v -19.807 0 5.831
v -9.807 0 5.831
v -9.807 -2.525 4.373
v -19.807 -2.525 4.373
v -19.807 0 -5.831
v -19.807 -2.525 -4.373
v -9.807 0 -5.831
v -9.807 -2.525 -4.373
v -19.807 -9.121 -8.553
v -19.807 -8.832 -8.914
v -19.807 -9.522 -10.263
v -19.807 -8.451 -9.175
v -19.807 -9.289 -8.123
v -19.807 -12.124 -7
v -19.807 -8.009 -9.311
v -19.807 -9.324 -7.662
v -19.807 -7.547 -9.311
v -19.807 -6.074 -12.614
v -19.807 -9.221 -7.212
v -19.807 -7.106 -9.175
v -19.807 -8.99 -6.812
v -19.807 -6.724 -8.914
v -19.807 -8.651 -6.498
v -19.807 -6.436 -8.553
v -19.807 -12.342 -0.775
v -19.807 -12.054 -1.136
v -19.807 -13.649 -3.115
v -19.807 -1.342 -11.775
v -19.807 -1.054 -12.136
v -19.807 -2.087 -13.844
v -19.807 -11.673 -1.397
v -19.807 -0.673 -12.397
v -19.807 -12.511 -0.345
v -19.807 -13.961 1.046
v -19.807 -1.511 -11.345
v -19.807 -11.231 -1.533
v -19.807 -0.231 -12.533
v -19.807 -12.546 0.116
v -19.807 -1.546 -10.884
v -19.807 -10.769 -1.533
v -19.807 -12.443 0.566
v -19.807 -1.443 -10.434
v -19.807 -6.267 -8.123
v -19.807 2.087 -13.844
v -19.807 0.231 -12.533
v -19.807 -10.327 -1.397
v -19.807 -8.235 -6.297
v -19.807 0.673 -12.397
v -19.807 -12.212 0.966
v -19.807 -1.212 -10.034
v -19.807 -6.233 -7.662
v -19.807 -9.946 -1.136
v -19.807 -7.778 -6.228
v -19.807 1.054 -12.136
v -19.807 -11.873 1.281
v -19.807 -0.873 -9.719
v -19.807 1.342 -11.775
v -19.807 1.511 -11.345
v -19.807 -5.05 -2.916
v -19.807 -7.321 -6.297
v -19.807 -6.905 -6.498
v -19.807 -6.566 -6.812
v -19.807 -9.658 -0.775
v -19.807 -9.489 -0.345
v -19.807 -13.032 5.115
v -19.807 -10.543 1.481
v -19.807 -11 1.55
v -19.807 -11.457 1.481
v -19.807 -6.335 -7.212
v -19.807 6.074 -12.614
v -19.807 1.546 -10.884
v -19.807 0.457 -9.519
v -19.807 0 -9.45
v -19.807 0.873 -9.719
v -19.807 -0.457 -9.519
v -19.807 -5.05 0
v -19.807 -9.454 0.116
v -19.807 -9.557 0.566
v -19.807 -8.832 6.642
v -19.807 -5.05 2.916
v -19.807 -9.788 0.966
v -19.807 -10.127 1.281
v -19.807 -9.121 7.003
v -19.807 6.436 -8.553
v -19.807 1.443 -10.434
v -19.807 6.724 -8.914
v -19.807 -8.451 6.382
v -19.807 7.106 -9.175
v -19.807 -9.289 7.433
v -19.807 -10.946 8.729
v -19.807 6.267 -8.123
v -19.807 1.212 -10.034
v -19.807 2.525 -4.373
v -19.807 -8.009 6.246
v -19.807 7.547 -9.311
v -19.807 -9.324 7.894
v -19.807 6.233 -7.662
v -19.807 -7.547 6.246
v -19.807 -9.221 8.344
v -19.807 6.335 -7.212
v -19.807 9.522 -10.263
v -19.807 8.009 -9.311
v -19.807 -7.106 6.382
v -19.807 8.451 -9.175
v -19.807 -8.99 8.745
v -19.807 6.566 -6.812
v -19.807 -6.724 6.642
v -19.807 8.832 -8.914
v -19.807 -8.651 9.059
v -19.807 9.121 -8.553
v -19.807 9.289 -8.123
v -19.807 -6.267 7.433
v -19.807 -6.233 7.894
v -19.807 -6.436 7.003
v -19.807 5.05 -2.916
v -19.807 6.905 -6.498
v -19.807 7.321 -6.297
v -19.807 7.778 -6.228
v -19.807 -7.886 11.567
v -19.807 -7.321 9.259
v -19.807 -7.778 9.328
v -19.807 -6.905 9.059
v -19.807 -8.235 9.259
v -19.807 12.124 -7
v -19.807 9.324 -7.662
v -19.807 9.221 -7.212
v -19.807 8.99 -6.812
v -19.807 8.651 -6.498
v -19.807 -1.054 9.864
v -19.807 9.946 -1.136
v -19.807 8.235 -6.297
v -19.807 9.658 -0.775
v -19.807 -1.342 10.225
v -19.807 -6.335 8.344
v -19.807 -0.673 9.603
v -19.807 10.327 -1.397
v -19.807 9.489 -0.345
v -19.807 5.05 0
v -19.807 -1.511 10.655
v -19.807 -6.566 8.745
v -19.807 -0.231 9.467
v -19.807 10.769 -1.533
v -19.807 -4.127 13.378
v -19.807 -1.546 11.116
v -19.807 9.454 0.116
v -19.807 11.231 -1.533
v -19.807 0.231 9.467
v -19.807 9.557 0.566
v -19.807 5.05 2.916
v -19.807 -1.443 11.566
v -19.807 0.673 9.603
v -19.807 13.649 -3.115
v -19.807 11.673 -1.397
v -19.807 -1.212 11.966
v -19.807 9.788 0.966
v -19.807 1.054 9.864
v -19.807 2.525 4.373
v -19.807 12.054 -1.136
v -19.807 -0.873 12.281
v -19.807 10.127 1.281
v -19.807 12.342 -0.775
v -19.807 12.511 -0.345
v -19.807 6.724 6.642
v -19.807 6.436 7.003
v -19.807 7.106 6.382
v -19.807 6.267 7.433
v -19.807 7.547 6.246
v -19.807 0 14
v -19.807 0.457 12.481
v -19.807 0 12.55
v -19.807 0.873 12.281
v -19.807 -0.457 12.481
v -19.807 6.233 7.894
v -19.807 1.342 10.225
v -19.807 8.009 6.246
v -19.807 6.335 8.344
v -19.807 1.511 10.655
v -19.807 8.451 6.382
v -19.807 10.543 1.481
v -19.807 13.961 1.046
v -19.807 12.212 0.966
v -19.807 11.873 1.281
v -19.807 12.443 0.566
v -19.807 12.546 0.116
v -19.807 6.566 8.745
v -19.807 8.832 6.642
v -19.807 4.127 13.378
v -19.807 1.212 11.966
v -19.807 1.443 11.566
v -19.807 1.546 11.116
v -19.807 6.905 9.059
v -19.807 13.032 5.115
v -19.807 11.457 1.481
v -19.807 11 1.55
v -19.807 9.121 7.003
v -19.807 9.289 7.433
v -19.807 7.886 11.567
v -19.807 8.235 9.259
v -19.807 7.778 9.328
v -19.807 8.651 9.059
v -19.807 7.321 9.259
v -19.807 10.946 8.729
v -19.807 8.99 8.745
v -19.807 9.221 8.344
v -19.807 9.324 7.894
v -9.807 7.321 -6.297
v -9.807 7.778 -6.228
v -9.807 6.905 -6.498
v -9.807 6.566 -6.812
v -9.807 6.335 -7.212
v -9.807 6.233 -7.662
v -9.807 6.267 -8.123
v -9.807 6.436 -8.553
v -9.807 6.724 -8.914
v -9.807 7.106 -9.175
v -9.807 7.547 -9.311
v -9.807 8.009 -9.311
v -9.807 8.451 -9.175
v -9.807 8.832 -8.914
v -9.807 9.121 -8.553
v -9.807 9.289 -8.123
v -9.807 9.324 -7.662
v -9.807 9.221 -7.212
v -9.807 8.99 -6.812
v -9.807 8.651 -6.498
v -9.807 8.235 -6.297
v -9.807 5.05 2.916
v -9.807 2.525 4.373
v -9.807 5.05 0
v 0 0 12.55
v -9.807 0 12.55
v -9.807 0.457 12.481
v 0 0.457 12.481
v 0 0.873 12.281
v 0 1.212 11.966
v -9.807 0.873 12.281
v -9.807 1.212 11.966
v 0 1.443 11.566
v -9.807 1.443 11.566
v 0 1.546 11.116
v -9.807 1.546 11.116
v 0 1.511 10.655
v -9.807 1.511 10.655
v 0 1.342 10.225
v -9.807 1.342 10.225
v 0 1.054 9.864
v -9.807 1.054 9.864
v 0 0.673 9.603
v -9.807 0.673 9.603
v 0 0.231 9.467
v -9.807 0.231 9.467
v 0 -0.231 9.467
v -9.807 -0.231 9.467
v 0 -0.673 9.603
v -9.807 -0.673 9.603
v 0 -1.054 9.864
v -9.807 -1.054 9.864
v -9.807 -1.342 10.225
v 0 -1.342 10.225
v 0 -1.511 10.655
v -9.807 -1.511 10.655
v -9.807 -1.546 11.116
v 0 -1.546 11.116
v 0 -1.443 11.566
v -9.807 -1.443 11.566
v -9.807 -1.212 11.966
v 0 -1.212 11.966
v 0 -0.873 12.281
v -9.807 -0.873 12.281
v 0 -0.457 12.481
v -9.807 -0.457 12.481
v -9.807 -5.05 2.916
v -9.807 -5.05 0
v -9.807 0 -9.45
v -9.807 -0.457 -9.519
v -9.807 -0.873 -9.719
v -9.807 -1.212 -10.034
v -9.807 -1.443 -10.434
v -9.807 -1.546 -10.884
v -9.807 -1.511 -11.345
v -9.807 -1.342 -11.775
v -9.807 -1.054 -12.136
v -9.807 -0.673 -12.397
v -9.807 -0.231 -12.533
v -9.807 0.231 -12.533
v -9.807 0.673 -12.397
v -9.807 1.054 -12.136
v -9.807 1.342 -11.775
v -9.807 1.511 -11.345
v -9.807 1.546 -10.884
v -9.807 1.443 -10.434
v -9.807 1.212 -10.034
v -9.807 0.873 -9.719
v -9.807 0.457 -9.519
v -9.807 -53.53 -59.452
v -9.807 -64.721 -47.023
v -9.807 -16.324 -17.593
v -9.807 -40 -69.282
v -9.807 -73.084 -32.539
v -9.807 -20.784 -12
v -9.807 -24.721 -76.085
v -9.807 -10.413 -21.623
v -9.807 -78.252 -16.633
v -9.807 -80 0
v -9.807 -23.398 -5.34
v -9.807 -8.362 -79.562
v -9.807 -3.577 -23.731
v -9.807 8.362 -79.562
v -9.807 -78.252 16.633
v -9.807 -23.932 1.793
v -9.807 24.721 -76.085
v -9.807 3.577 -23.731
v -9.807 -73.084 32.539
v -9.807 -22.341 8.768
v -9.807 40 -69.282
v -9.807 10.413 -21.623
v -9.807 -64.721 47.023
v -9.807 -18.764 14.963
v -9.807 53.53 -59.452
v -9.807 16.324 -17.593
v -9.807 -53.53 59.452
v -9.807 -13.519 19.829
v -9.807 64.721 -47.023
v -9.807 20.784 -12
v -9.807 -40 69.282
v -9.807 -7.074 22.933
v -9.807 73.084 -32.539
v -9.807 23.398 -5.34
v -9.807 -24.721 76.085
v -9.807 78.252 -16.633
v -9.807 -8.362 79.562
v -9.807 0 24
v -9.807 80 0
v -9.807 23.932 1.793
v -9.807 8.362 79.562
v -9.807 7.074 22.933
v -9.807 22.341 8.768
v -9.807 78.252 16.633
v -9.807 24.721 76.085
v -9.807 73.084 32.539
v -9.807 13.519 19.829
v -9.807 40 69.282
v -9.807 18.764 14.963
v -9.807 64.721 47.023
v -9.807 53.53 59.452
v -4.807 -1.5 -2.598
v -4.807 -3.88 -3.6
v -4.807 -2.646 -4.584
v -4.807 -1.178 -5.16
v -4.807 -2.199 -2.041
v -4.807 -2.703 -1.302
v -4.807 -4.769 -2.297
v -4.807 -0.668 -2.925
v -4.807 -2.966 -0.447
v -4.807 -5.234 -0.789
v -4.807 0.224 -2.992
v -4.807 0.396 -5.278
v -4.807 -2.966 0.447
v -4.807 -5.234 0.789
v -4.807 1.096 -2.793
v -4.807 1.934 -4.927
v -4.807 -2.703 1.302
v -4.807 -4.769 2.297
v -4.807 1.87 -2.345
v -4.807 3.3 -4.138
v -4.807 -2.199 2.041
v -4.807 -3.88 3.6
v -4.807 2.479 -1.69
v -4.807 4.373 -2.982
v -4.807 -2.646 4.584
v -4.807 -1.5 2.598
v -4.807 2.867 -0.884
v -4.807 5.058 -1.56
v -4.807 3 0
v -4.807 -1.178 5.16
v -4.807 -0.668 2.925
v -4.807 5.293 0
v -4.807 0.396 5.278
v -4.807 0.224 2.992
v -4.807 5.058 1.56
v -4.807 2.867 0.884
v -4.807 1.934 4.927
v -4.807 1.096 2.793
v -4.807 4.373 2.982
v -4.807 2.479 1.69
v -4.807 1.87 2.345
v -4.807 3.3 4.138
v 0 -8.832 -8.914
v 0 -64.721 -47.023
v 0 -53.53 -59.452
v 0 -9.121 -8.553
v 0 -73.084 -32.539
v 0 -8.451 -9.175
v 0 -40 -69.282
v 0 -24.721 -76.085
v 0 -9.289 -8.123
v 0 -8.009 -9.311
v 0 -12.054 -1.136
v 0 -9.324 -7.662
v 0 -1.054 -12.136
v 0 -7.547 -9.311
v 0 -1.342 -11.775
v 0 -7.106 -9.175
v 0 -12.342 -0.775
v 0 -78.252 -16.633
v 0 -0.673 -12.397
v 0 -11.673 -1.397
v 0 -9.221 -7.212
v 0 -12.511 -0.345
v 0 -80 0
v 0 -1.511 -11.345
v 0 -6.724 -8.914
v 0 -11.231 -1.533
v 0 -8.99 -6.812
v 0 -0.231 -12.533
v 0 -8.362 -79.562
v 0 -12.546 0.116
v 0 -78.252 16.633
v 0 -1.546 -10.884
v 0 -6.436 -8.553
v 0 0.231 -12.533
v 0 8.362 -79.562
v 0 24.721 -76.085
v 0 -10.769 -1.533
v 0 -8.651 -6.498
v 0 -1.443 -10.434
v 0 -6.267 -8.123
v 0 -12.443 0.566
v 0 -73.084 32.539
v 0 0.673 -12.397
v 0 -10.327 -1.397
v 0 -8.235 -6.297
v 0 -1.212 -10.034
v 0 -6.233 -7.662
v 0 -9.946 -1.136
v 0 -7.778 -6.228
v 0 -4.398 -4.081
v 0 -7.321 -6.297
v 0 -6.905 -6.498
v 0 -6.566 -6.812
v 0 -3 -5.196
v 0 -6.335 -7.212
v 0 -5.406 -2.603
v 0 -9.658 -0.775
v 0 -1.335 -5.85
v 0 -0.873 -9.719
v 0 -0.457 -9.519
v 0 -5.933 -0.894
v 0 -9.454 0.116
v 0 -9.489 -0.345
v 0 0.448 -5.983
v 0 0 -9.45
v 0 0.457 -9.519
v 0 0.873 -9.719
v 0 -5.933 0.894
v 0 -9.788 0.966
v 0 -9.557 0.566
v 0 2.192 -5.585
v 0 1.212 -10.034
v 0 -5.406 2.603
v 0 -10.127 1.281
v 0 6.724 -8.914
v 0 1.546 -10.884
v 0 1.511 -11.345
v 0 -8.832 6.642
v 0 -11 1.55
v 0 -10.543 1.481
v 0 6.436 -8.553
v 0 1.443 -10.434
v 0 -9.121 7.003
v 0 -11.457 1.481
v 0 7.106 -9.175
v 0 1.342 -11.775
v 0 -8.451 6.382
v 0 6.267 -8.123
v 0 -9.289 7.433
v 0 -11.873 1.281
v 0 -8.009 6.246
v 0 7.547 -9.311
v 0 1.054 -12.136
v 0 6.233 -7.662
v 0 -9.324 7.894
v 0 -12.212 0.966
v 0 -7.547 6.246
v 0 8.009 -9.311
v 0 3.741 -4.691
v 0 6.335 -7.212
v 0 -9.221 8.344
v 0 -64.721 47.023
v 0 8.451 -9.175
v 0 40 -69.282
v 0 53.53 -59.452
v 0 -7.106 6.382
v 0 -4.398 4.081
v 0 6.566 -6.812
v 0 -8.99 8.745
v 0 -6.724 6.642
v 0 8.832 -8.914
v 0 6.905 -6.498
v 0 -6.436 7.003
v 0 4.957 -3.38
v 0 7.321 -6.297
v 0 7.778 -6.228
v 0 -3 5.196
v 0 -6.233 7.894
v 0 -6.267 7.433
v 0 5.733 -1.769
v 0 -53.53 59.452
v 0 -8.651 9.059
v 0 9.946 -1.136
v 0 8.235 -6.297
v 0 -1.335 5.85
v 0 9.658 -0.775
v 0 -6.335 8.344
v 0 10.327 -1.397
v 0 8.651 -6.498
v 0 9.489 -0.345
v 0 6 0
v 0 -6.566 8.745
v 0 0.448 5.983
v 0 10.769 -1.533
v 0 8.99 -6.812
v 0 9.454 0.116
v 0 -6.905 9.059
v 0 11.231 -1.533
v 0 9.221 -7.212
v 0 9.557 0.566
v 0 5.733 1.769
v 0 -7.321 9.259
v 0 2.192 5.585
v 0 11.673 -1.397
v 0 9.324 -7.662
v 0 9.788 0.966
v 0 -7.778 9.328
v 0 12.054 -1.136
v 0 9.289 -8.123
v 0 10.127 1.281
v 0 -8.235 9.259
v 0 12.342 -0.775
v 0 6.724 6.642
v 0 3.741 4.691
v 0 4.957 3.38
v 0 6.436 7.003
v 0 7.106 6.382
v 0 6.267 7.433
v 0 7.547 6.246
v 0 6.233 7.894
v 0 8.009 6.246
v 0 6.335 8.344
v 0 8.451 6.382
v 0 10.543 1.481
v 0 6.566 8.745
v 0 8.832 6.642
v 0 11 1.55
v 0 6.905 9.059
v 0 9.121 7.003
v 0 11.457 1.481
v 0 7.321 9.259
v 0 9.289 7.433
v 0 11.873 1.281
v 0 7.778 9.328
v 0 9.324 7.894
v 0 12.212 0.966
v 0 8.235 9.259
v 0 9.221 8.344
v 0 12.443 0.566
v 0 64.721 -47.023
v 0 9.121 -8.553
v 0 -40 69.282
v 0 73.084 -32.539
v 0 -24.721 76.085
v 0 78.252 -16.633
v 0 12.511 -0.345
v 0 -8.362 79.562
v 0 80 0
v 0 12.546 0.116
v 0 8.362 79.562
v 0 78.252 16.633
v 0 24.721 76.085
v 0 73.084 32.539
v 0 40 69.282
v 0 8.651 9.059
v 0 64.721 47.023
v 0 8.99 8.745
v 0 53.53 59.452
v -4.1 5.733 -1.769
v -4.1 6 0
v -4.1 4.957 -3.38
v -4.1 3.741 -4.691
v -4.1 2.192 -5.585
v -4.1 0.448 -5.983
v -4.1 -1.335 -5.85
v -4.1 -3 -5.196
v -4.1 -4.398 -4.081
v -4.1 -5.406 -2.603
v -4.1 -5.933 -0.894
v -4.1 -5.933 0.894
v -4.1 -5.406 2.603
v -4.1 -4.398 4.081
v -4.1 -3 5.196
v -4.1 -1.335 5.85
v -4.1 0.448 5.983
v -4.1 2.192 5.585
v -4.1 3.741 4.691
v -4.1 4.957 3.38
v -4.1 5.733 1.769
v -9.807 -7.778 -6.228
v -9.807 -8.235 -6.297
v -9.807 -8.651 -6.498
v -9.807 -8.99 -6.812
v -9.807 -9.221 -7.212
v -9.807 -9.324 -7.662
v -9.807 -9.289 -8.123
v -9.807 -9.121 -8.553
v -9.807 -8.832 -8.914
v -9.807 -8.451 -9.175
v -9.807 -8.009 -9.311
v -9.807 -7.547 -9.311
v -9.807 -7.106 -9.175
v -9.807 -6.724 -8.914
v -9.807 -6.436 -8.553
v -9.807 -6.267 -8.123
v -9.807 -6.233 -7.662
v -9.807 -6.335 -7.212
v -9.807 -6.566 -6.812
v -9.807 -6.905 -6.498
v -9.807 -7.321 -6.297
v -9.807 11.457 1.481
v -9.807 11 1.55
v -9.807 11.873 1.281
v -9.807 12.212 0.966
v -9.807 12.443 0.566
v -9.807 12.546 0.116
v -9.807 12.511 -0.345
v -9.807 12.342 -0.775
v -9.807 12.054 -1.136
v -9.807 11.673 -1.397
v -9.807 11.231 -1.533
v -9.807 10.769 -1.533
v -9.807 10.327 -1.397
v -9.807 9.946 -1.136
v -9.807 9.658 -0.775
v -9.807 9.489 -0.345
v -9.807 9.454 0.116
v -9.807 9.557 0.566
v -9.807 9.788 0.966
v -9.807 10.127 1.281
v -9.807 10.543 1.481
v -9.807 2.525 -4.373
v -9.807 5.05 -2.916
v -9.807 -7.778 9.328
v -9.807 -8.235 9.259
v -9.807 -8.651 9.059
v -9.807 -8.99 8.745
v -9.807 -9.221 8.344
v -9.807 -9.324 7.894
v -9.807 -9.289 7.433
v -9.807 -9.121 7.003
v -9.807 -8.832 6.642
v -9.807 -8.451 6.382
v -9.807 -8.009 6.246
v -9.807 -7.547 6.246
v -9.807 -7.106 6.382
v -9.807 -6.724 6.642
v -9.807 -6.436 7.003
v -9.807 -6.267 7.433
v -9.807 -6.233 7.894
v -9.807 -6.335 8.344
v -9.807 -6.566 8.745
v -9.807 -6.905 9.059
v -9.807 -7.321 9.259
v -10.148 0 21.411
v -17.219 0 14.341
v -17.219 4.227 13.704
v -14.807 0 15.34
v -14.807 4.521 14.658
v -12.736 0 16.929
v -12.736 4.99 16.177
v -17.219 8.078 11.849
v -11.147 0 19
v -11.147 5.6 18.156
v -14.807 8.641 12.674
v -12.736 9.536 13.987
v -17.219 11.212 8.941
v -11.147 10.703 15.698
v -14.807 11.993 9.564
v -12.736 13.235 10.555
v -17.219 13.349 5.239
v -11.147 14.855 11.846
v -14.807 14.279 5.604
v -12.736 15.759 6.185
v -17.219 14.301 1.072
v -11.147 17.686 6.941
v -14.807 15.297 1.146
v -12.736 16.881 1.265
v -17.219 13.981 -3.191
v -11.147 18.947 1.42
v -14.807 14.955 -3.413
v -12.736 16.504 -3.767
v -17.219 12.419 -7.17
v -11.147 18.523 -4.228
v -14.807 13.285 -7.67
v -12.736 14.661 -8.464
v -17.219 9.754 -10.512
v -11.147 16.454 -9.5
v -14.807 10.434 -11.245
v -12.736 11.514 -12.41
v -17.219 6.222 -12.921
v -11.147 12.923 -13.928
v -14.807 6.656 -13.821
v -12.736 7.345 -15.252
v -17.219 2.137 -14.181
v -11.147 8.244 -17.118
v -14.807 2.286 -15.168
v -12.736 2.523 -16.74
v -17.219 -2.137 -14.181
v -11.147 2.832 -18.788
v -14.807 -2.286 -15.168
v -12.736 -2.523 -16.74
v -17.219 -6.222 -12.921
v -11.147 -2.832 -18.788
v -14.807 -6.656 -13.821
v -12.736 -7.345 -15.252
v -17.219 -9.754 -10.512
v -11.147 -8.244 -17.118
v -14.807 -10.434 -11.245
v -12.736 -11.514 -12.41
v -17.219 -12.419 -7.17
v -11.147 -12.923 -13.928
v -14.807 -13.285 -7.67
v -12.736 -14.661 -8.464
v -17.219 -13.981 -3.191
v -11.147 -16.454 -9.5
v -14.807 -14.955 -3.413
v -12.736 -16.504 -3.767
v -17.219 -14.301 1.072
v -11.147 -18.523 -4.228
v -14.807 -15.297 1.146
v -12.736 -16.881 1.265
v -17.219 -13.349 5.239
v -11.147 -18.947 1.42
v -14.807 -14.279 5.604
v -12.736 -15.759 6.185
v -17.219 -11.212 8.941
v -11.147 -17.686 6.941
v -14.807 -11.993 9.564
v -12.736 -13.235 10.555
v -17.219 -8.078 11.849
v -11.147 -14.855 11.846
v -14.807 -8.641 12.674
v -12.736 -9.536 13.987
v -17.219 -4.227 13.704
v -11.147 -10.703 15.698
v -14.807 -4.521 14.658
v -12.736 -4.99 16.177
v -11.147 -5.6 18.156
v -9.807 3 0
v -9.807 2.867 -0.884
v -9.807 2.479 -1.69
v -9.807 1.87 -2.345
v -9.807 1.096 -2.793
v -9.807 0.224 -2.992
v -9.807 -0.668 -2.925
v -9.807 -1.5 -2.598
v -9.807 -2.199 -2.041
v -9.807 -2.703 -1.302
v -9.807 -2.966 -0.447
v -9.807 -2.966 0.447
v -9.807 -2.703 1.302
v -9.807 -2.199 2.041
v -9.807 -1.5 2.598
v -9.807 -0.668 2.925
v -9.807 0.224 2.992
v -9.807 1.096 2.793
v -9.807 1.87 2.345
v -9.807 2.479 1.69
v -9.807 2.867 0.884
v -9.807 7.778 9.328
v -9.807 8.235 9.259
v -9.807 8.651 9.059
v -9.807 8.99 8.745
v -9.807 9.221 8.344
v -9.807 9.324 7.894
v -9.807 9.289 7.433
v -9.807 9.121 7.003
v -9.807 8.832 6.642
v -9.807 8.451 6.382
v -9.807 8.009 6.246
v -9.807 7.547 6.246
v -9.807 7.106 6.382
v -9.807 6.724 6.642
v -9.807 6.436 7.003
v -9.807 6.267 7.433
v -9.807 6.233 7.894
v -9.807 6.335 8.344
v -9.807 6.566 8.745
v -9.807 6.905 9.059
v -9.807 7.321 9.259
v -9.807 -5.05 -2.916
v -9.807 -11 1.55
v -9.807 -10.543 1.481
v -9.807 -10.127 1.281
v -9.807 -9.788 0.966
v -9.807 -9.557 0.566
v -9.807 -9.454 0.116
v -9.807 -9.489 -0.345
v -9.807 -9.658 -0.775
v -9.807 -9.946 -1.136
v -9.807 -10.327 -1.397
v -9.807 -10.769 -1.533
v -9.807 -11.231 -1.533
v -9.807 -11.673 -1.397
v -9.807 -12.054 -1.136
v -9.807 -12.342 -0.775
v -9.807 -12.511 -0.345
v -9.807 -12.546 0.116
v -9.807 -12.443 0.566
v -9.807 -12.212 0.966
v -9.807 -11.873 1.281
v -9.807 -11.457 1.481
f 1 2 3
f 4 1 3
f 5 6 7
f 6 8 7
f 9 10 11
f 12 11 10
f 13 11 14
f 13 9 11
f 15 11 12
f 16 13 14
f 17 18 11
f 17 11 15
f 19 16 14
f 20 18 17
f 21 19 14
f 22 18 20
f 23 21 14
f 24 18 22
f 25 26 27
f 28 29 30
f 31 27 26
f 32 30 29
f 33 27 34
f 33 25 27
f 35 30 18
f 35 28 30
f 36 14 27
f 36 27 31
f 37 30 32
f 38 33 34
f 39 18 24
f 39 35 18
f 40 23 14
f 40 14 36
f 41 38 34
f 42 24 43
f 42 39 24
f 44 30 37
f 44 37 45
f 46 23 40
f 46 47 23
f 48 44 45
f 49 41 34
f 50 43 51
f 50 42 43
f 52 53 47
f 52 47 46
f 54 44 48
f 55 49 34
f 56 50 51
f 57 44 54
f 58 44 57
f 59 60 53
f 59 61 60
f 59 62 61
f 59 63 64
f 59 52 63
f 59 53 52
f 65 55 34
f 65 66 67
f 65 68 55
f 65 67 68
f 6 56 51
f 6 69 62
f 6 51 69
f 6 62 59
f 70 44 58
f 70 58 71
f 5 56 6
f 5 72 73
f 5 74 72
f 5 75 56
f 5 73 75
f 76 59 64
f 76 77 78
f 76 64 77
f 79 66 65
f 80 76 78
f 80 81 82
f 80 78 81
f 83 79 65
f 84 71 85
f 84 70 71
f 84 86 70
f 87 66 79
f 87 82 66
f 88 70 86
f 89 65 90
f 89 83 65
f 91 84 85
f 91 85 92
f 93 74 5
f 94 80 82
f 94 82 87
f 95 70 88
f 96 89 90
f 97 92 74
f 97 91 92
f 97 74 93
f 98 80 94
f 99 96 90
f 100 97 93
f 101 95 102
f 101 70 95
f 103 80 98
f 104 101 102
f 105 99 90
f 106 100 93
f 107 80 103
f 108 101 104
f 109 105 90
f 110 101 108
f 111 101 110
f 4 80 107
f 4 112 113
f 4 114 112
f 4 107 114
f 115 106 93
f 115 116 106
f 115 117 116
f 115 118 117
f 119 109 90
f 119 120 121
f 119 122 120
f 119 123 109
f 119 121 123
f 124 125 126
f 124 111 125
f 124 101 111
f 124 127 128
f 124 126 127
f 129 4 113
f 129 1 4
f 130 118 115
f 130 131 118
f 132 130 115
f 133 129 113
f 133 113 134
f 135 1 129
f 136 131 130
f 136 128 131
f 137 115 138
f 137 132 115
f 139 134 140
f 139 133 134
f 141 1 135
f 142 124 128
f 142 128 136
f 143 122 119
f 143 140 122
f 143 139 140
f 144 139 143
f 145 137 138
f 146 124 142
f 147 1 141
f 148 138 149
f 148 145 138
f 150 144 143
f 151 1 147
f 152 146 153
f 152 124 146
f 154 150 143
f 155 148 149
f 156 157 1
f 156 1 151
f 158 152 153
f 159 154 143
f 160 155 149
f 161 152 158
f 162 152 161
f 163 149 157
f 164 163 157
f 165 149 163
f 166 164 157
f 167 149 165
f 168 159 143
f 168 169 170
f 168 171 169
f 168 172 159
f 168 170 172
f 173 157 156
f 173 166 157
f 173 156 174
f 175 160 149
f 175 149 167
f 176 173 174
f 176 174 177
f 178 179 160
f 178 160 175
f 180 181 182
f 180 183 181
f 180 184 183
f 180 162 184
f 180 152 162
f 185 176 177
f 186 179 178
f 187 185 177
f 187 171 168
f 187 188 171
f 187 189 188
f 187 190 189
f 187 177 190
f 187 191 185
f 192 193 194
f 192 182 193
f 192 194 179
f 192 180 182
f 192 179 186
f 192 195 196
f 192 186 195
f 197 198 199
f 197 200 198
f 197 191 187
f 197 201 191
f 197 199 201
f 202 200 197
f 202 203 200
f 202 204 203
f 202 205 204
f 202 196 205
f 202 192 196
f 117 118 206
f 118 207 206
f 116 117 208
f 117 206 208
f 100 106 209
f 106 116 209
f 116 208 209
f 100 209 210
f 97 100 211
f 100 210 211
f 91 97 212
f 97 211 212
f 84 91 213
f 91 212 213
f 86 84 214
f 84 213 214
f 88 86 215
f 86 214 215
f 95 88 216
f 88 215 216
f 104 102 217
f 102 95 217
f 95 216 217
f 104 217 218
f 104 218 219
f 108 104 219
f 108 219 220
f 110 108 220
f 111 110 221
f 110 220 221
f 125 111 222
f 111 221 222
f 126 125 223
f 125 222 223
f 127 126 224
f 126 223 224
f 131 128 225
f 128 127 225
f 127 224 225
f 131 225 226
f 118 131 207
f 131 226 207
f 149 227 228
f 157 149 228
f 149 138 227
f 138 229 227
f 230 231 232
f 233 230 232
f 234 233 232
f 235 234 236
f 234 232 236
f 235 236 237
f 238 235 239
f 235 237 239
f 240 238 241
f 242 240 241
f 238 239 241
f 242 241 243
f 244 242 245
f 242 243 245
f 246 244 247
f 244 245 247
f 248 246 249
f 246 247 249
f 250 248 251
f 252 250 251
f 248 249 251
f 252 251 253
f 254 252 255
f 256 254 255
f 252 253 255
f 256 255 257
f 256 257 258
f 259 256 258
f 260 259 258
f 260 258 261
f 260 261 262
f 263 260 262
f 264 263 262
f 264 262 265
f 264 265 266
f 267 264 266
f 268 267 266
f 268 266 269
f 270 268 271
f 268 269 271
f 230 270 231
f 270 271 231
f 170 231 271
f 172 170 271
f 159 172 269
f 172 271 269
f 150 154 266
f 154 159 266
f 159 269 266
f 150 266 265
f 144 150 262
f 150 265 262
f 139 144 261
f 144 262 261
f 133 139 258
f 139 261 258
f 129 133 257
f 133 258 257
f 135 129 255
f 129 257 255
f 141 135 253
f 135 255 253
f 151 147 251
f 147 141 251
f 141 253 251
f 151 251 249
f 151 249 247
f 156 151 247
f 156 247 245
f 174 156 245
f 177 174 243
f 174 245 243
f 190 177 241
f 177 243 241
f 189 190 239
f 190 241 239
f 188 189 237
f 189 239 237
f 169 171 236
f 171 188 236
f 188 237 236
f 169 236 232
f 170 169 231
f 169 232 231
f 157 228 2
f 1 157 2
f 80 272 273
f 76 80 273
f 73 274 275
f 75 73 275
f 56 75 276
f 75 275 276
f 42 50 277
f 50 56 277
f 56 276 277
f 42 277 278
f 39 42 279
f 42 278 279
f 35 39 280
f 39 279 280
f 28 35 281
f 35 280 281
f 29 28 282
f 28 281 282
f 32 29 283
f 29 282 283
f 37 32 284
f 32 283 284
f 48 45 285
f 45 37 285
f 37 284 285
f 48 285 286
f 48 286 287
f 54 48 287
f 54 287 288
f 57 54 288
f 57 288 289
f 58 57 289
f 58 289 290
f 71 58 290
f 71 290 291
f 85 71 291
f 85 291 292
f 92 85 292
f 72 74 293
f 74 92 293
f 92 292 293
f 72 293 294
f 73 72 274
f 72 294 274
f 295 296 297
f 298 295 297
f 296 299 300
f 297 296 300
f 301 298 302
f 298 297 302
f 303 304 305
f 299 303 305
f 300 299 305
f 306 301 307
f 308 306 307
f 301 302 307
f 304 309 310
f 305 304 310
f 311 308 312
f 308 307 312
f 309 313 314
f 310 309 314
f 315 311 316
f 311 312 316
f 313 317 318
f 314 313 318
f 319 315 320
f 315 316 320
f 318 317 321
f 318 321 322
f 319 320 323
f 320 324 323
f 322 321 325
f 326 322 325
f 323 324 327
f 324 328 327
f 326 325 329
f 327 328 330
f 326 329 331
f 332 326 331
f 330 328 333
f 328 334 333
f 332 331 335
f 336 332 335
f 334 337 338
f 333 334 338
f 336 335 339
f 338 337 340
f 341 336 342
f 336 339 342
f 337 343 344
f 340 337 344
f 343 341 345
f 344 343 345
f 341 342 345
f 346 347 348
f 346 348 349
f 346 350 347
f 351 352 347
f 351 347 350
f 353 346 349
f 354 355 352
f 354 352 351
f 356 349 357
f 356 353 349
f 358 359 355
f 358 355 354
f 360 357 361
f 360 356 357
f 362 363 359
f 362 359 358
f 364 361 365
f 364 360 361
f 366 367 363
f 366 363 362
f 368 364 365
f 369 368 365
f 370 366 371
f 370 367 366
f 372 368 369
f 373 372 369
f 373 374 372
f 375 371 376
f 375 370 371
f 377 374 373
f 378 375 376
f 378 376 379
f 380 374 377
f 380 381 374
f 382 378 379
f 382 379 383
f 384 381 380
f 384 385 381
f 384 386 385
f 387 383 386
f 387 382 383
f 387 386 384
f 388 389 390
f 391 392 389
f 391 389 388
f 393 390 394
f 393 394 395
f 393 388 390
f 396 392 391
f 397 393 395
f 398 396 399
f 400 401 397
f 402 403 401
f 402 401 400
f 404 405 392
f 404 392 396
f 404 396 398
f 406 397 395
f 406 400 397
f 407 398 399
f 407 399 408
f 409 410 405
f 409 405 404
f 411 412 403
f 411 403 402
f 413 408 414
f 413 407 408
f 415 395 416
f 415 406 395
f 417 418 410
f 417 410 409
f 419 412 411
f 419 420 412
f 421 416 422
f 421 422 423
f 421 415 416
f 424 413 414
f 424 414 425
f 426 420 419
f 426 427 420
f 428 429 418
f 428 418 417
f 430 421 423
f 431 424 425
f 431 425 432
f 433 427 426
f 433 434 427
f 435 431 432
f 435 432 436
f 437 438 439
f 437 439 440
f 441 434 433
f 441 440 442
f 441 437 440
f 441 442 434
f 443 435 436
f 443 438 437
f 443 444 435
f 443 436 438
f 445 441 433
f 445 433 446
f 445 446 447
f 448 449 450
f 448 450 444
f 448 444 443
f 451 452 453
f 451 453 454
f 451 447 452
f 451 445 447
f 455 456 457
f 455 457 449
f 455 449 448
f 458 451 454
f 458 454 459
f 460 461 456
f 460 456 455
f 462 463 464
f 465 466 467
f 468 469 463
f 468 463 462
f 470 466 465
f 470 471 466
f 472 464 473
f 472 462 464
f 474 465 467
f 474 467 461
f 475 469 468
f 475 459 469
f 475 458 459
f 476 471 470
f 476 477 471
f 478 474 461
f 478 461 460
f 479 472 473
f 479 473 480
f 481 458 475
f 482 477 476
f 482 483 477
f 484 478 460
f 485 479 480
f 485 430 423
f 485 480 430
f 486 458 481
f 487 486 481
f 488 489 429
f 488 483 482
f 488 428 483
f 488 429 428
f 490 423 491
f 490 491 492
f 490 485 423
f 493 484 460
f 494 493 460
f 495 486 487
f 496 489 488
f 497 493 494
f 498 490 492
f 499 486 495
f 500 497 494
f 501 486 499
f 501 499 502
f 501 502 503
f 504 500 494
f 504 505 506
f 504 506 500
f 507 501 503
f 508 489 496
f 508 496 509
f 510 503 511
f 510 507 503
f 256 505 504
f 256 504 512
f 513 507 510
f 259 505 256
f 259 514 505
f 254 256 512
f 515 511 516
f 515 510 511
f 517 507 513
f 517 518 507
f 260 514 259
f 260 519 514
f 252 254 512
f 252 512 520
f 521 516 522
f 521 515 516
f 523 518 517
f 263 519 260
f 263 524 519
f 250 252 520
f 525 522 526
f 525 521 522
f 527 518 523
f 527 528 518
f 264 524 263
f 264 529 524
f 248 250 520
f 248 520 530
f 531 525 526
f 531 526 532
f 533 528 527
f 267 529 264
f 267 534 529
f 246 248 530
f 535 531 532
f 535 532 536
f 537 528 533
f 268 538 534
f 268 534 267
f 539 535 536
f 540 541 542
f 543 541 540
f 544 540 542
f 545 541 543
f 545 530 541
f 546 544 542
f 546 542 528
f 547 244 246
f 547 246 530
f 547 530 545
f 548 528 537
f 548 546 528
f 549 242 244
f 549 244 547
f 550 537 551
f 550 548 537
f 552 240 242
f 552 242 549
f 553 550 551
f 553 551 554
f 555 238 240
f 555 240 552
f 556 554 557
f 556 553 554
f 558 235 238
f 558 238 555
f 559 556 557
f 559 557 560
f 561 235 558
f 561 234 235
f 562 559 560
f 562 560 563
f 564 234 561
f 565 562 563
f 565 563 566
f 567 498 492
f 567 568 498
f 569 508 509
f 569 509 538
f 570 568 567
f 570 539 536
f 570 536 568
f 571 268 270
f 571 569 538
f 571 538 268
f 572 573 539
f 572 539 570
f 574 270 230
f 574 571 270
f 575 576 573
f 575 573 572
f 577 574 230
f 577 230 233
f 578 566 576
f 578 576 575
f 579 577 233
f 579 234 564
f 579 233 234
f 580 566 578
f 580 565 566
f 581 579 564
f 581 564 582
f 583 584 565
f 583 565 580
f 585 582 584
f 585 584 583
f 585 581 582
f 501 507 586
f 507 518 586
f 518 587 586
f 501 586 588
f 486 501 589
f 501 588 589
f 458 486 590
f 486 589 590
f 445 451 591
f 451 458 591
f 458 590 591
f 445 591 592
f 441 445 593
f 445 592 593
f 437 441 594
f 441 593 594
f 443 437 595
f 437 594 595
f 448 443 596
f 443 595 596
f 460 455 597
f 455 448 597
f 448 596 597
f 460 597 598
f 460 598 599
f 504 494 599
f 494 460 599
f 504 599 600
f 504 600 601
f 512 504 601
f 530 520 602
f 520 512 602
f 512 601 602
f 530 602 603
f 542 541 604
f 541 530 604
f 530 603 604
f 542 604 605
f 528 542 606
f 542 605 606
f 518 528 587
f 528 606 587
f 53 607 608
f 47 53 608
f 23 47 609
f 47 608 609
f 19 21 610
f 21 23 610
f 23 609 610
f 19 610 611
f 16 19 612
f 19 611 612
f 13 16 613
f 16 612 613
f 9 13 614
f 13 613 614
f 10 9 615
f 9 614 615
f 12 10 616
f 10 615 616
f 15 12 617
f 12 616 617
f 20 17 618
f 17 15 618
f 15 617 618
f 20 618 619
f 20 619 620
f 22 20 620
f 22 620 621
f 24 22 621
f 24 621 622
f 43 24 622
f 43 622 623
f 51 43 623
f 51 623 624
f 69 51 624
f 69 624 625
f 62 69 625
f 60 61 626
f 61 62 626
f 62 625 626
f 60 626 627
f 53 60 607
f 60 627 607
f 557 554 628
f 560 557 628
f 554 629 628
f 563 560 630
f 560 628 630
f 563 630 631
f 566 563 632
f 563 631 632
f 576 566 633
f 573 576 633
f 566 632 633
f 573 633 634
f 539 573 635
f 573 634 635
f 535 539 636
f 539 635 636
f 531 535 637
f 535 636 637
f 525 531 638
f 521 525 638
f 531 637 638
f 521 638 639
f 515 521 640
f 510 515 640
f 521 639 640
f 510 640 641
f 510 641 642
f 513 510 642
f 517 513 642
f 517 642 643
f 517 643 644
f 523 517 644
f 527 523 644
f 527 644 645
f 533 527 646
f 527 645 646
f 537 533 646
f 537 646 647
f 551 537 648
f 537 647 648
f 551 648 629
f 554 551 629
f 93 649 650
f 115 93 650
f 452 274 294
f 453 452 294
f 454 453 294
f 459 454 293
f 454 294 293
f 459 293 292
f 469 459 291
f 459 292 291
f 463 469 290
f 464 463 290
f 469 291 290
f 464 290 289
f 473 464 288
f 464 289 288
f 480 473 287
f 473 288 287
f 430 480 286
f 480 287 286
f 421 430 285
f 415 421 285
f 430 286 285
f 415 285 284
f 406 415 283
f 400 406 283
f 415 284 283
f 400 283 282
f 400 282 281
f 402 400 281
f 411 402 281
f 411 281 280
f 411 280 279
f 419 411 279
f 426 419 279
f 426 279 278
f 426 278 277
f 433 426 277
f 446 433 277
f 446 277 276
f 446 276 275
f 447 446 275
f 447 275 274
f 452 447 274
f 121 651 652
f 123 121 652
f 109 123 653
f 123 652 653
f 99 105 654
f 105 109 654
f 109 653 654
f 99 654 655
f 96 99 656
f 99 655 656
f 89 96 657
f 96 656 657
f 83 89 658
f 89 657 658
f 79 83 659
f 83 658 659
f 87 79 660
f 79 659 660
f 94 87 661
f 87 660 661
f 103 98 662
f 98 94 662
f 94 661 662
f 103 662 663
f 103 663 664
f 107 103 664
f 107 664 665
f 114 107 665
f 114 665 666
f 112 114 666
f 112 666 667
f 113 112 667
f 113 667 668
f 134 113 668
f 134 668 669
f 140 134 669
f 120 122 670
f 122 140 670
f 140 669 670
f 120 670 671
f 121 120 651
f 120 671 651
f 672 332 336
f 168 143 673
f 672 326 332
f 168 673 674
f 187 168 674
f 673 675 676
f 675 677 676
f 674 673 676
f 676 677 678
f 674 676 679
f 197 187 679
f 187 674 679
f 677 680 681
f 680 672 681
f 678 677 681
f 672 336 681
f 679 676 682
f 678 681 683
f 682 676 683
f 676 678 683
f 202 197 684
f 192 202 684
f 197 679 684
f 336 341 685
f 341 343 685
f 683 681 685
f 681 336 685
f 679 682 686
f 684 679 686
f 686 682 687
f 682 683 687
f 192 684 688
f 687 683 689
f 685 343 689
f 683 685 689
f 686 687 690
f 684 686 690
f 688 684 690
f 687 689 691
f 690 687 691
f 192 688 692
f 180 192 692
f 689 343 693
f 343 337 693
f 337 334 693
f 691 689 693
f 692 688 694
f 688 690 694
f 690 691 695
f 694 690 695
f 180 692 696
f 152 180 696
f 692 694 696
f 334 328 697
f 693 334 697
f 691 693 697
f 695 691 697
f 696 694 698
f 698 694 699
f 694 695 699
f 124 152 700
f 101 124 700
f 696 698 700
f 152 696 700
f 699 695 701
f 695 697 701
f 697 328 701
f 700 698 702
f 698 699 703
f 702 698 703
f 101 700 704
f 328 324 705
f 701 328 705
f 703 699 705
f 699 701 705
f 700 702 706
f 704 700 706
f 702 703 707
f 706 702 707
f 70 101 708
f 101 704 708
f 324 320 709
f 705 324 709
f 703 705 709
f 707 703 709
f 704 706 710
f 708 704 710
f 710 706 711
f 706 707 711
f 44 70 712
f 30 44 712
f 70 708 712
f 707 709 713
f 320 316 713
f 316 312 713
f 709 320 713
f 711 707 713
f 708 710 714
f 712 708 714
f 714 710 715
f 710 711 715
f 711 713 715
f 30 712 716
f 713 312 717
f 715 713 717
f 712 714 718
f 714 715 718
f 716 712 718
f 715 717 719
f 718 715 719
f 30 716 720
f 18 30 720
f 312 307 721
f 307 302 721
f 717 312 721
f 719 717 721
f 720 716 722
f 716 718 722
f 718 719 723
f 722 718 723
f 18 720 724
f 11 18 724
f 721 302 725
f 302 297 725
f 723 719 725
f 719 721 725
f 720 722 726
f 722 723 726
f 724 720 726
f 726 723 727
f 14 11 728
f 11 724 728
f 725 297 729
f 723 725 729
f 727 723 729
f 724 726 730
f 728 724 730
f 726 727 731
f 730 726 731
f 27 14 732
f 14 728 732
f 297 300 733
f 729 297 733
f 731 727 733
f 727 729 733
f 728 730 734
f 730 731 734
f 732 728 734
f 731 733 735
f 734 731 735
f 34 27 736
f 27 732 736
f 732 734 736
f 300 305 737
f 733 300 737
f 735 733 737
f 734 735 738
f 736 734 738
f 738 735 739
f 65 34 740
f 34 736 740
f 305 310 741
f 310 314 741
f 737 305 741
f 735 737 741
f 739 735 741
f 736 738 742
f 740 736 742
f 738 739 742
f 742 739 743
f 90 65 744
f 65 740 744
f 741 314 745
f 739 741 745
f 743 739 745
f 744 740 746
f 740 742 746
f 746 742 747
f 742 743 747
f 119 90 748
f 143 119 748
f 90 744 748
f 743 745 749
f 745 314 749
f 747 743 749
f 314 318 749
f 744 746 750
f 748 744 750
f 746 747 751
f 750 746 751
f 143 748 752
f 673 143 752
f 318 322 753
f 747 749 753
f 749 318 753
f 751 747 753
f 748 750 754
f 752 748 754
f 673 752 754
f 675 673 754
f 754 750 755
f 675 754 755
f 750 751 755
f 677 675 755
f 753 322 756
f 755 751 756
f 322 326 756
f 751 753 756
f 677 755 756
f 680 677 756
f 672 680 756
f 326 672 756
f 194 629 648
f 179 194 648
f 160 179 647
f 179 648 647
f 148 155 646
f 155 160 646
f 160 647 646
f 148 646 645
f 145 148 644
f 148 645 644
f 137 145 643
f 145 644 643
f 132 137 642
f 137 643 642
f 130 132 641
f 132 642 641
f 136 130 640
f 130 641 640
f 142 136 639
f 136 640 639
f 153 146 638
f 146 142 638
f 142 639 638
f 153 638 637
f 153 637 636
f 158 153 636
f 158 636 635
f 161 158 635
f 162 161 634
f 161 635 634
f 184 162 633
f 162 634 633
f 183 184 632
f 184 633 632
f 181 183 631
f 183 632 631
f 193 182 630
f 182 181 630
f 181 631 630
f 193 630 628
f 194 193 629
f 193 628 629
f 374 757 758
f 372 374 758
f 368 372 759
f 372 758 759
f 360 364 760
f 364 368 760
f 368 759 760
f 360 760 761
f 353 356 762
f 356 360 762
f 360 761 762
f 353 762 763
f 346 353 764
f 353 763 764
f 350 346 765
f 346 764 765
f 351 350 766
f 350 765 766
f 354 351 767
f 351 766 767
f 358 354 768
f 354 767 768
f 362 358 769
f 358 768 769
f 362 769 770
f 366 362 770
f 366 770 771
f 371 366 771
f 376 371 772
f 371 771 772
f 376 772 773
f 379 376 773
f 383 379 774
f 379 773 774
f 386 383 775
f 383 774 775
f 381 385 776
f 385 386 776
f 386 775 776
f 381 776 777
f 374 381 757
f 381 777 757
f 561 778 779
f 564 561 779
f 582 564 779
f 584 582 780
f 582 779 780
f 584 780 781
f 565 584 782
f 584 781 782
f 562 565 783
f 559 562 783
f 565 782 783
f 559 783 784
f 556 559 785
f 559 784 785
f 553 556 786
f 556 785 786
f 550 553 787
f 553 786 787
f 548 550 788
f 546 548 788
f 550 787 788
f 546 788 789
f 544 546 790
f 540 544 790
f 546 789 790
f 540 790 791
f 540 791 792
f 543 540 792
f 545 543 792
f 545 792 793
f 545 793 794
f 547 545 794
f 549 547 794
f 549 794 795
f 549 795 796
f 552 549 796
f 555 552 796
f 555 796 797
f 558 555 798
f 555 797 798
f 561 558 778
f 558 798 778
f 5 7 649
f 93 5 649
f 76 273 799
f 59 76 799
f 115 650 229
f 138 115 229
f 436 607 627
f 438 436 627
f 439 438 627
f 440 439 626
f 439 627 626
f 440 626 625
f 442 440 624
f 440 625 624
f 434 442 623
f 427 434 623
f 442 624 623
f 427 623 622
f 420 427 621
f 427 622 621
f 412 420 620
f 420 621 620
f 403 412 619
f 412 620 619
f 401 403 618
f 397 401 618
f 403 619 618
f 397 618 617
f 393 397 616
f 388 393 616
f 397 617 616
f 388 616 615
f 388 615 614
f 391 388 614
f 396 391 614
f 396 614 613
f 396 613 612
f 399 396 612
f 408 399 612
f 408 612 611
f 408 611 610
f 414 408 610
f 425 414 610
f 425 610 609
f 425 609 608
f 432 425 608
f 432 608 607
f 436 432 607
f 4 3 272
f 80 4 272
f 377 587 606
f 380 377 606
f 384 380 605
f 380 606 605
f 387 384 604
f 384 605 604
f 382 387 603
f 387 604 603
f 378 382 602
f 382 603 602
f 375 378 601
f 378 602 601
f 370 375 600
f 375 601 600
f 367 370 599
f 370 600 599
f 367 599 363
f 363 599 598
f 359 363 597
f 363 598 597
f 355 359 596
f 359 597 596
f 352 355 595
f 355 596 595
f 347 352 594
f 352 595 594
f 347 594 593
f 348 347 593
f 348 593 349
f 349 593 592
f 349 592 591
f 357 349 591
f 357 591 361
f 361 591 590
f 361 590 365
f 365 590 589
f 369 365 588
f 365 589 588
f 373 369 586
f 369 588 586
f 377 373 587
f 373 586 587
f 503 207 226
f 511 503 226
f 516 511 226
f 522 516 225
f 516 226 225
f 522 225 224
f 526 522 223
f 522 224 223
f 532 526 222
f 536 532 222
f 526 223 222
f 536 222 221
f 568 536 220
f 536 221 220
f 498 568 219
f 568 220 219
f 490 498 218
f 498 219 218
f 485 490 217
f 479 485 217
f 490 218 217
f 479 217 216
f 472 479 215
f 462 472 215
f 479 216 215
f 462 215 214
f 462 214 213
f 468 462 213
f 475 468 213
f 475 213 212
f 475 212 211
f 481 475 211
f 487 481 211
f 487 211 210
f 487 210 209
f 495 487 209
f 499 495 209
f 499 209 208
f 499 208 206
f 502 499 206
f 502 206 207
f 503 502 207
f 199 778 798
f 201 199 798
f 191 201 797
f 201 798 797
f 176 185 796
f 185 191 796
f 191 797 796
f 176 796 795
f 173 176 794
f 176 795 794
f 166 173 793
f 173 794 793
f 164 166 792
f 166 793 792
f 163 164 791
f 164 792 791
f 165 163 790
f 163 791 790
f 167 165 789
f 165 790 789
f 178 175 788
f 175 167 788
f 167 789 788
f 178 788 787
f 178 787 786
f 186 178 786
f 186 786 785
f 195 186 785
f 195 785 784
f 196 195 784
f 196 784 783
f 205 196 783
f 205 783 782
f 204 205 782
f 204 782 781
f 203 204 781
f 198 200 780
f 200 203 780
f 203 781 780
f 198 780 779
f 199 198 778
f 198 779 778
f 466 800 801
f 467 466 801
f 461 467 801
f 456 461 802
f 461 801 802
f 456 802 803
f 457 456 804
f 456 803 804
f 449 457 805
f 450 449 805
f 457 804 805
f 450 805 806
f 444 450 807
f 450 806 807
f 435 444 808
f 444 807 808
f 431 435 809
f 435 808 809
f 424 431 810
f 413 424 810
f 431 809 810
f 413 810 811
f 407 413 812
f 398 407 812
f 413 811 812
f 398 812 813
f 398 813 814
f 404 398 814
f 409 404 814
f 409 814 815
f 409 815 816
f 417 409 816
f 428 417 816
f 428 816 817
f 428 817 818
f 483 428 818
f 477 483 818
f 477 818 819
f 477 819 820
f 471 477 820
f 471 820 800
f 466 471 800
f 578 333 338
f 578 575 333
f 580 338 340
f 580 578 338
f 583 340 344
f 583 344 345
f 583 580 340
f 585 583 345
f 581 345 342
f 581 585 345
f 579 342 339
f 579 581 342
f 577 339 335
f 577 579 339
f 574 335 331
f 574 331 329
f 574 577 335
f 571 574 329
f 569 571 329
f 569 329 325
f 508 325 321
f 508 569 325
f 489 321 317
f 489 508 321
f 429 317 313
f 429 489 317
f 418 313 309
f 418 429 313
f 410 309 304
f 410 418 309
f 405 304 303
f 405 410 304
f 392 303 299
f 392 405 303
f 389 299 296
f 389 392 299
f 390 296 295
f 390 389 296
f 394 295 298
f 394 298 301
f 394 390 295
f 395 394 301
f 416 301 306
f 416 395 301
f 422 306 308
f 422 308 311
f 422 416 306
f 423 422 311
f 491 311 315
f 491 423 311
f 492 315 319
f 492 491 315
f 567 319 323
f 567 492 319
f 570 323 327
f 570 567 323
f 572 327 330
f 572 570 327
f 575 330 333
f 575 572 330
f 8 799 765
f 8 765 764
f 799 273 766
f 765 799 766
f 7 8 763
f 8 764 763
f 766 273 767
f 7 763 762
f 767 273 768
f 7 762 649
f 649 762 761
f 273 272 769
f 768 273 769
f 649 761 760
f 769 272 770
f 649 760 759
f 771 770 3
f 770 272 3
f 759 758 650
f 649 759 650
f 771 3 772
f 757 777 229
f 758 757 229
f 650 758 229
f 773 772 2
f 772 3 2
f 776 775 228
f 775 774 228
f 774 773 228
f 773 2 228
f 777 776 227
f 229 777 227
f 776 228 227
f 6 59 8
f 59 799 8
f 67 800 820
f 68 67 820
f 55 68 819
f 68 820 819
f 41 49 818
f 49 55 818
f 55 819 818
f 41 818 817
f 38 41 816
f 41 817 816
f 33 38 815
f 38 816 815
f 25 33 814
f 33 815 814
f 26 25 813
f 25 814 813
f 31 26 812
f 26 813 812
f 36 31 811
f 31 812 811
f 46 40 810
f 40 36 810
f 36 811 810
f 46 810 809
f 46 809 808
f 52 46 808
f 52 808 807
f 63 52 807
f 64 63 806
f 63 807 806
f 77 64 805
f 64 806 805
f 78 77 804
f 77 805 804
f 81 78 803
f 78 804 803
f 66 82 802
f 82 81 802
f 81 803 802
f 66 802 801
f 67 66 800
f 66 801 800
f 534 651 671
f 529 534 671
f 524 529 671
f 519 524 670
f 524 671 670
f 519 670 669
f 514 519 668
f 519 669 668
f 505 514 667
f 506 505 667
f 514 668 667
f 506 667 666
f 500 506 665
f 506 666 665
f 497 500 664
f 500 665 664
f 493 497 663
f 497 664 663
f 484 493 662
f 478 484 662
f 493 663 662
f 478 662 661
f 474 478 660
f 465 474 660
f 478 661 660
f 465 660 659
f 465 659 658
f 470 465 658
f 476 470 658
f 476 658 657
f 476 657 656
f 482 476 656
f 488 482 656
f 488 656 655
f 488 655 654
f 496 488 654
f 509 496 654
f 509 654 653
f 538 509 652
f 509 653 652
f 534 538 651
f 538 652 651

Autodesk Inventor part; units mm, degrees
ref_plane "YZ Plane" through (0, 0, 0) normal (1, 0, 0) x (0, 1, 0)
ref_plane "XZ Plane" through (0, 0, 0) normal (0, 1, 0) x (-1, 0, 0)
ref_plane "XY Plane" through (0, 0, 0) normal (0, 0, 1) x (1, 0, 0)
sketch "Szkic1" plane through (0, 0, 0) normal (0, 0, 1) x (1, 0, 0)
  line L0 (-25.2071, 0) -> (82.5929, 0) projected
  line L1 (0, -16) -> (0, 96) projected
  line L2 (0, 0) -> (0, 6) construction
  line L3 (0, 6) -> (-4.1, 6)
  line L4 (-4.1, 6) -> (-4.8071, 5.2929)
  line L5 (-4.1, 6) -> (-3.1, 6) construction
  line L6 (0, 0) -> (-4.8071, 0) construction
  line L7 (-4.8071, 0) -> (-4.8071, 3) construction
  line L8 (-4.8071, 3) -> (-4.8071, 5.2929)
  line L9 (-4.8071, 3) -> (-9.8071, 3)
  line L10 (-9.8071, 3) -> (-9.8071, 80)
  line L11 (-9.8071, 3) -> (67.1929, 3) construction
  line L12 (-9.8071, 80) -> (0, 80)
  line L13 (0, 80) -> (0, 6)
  dimension "d0" = 6
  dimension "d1" = 4.1
  dimension "d5" = 1
  dimension "d6" = 135
  dimension "d7" = 3
  dimension "d8" = 5
  dimension "d9" = 77
  dimension "d10" = 90
revolve "Obrót1" add sketch "Szkic1" angle 360 about axis through (-10, 0, 0) along (1, 0, 0)
sketch "Szkic2" plane through (-9.8071, 0, 0) normal (-1, 0, 0) x (0, 0, 1)
  line L0 (0, 0) -> (11, 0) construction
  circle A0 centre (11, 0) radius 1.55
  circle A1 centre (7.7782, 7.7782) radius 1.55
  circle A2 centre (0, 11) radius 1.55
  circle A3 centre (-7.7782, 7.7782) radius 1.55
  circle A4 centre (-11, 0) radius 1.55
  circle A5 centre (-7.7782, -7.7782) radius 1.55
  circle A6 centre (0, -11) radius 1.55
  circle A7 centre (7.7782, -7.7782) radius 1.55
  circle A8 centre (0, 0) radius 14
  circle A9 centre (0, 0) radius 5.05
  line L1 (5.8312, 0) -> (2.9156, -5.05)
  line L2 (2.9156, 5.05) -> (5.8312, 0)
  line L3 (-2.9156, 5.05) -> (2.9156, 5.05)
  line L4 (-5.8312, 0) -> (-2.9156, 5.05)
  line L5 (-2.9156, -5.05) -> (-5.8312, 0)
  line L6 (2.9156, -5.05) -> (-2.9156, -5.05)
  point P0 (0, -5.05)
  dimension "d21" = 10.1
  dimension "d12" = 11
  dimension "d13" = 3.1
  dimension "d16" = 360
  dimension "d20" = 28
  dimension "d26" = 360
extrude "Wyciągnięcie proste1" cut sketch "Szkic2" against normal through all contours A0 | A1 | A2 | A3 | A4 | A5 | A6 | A7
extrude "Wyciągnięcie proste2" add sketch "Szkic2" along normal blind 10
fillet "Zaokrąglenie1" radius 10 1 edges at (-9.8071, 0, -14)
properties part number "uMule-kolo_napędowe"
